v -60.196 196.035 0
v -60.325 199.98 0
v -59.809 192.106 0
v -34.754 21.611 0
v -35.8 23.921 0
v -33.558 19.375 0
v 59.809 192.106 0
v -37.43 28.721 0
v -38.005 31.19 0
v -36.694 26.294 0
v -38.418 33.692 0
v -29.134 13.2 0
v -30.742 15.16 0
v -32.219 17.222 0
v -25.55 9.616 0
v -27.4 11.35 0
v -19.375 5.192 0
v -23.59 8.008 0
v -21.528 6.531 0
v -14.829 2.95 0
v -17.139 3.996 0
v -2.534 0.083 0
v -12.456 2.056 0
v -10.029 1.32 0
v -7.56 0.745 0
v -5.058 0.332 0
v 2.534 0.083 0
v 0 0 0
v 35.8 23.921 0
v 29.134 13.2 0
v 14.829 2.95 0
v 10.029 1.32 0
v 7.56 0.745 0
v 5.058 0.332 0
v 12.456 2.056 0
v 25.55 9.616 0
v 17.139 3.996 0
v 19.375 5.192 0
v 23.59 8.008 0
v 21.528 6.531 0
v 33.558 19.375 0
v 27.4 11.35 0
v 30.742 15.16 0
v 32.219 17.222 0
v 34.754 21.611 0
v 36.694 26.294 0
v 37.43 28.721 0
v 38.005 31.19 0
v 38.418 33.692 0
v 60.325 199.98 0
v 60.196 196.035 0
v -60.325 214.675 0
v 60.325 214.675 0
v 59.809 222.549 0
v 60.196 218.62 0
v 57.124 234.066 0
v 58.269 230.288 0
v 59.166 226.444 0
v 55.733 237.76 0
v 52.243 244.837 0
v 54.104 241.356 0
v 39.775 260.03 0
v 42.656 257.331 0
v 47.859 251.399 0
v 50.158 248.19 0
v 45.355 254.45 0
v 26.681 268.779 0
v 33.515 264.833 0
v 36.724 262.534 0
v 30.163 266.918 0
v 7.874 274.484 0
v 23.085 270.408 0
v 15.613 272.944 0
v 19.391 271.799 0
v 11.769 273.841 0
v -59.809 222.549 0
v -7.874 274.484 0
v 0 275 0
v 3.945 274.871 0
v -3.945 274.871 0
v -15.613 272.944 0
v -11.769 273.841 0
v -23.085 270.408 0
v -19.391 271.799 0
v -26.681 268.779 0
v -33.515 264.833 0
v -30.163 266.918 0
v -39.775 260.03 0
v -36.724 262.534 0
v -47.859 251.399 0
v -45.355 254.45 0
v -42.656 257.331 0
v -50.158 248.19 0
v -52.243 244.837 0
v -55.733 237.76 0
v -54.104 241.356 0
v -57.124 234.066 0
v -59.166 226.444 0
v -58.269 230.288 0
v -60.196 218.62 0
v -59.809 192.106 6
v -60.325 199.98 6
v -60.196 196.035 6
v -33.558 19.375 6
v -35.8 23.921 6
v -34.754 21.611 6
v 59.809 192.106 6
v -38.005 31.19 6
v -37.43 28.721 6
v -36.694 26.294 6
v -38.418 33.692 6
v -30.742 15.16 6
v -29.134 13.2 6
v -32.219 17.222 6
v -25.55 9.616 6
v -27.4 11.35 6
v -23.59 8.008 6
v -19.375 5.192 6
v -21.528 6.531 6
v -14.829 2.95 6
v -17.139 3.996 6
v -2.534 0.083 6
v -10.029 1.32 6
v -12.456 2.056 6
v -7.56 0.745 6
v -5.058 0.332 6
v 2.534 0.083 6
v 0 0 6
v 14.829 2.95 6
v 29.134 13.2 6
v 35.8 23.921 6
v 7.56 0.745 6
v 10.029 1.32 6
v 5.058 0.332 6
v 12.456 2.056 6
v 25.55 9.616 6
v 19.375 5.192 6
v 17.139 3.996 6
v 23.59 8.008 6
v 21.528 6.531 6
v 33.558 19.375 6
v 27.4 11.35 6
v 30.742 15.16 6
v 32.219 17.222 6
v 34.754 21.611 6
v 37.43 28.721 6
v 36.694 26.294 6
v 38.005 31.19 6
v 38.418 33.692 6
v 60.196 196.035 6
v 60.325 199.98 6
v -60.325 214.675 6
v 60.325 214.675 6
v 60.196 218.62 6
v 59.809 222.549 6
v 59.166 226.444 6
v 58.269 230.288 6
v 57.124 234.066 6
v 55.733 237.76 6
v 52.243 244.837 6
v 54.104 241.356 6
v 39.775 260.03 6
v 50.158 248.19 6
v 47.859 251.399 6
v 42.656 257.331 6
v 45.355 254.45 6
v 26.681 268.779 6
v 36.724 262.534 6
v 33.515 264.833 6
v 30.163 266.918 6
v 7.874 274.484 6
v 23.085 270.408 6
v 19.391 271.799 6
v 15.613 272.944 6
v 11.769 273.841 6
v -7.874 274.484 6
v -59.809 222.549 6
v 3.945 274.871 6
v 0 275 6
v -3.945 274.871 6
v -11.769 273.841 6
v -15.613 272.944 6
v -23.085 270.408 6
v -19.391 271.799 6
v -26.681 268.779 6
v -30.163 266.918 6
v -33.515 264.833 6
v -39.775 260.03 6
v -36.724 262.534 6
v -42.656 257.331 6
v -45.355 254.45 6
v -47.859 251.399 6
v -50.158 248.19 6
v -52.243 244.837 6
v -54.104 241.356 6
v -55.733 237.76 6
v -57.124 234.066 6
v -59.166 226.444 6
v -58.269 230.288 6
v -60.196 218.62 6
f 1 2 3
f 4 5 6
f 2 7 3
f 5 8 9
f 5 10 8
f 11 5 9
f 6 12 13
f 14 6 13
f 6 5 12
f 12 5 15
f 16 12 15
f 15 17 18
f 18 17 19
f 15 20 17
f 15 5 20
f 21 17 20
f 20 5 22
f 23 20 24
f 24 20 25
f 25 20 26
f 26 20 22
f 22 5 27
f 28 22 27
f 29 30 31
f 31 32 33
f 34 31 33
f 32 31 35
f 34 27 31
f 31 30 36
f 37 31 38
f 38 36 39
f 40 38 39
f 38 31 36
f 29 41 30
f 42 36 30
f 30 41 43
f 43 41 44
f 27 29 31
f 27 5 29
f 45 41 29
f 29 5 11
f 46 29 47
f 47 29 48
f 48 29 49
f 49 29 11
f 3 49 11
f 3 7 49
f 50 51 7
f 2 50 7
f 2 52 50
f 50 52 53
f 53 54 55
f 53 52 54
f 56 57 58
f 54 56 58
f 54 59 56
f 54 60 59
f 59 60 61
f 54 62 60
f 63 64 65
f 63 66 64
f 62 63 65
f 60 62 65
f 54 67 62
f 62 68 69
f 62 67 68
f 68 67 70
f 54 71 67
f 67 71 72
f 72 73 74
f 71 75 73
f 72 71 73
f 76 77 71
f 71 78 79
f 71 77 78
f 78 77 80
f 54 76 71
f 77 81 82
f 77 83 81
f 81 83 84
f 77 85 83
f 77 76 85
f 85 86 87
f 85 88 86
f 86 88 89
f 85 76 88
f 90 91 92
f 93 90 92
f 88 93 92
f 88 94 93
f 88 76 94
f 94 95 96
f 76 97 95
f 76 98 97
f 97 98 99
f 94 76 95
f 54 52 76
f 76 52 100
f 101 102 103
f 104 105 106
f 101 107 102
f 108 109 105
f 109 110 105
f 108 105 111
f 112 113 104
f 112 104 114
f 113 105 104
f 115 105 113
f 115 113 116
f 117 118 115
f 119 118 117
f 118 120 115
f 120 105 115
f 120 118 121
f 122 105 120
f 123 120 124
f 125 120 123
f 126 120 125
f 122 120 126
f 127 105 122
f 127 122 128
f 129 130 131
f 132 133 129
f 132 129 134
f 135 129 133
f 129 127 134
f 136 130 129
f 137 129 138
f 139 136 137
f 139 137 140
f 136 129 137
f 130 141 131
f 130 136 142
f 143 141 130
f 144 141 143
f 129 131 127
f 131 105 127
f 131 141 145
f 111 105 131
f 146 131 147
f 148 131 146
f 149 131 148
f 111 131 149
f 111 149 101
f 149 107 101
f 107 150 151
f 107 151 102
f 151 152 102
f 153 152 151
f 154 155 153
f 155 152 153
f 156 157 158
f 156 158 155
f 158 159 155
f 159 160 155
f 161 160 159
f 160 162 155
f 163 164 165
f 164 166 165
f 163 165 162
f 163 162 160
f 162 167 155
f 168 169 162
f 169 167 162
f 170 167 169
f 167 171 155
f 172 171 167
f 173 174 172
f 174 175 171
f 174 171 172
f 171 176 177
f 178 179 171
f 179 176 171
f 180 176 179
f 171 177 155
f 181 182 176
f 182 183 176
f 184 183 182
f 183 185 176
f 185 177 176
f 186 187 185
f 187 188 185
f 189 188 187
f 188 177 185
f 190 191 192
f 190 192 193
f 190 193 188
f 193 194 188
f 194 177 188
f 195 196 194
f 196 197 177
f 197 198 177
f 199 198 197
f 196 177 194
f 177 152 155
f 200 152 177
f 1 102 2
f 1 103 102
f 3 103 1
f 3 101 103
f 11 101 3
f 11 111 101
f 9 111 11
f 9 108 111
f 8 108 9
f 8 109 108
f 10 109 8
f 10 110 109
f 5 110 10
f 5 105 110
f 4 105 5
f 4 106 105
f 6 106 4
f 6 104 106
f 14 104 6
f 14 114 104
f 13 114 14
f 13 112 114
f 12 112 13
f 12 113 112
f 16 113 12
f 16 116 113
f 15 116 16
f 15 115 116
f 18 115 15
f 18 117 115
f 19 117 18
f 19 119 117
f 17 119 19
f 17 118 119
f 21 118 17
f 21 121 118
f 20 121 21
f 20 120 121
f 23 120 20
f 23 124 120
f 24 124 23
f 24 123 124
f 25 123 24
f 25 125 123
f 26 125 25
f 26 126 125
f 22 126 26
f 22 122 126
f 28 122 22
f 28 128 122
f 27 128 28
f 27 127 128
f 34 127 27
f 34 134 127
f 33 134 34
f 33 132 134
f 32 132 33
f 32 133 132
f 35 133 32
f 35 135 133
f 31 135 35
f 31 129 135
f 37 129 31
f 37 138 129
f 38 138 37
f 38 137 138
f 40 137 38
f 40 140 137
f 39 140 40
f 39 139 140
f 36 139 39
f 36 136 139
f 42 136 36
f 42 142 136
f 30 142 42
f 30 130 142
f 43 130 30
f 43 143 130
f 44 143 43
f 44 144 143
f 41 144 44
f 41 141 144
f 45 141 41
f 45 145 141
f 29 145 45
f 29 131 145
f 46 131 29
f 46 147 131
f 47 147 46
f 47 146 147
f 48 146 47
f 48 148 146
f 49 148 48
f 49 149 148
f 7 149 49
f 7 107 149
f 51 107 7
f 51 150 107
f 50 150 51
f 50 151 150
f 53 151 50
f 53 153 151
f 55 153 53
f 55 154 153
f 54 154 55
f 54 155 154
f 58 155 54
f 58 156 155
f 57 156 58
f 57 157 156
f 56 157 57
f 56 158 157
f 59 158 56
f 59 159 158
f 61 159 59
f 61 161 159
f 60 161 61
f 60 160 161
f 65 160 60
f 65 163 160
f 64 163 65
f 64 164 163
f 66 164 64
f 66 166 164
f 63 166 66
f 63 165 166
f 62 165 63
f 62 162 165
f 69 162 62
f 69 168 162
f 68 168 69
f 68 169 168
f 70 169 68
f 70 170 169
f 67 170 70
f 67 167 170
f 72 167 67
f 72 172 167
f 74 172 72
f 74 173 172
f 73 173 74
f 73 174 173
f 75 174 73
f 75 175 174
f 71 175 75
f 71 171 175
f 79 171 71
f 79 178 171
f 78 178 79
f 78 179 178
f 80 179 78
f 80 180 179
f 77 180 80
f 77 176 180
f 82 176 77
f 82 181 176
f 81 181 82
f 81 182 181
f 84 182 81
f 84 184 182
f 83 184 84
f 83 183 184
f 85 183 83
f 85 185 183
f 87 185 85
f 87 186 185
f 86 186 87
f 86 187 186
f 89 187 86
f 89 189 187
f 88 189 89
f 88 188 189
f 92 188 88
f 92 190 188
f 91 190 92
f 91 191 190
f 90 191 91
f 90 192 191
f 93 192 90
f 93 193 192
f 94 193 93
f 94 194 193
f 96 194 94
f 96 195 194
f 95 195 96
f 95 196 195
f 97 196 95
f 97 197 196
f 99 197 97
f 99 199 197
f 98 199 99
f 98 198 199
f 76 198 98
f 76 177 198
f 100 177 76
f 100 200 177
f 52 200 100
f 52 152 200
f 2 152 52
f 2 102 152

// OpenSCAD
// Parametric footbed / outsole - US men's 10.5 7E
// Toe-room focused: full ball width is held through the toes (no taper).
// Only foot_length and ball_width are chart-verified; the other widths are
// scaled from the size-8 D reference in infrawiki's shoe_ver_2.scad
// (Appropedia, CC-BY-SA-3.0). Rebuild from a real foot trace for final fit.

foot_length = 275;      // mm, US 10.5
ball_width  = 120.65;   // mm, 7E from healthyfeetstore.com width chart (4.75 in)
heel_width  = 77.5;
arch_width  = 70.1;     // narrowest point
mid_width   = 93.4;
toe_width   = 120.65;   // = ball_width, deliberately no toe taper
sole_thickness = 6;
outline_clearance = 0;  // mm added around the outline (set 2-3 for a footbed)

$fn = 96;

module station(cy, w) {
    ww = w + 2 * outline_clearance;
    translate([0, cy]) scale([ww, ww]) circle(d = 1);
}

module outline2d() {
    hull() {
        station(heel_width / 2, heel_width);
        station(0.2987 * foot_length, arch_width);
        station(0.5195 * foot_length, mid_width);
        station(0.7272 * foot_length, ball_width);
        station(foot_length - toe_width / 2, toe_width);
    }
}

// footbed
linear_extrude(height = sole_thickness) outline2d();

// print check: text is engraved on the heel so a wrong-scale print is obvious
if (false) {
    linear_extrude(height = sole_thickness + 0.2)
        translate([-40, 40]) text("10.5 7E - 120.65mm ball", size = 6);
}
